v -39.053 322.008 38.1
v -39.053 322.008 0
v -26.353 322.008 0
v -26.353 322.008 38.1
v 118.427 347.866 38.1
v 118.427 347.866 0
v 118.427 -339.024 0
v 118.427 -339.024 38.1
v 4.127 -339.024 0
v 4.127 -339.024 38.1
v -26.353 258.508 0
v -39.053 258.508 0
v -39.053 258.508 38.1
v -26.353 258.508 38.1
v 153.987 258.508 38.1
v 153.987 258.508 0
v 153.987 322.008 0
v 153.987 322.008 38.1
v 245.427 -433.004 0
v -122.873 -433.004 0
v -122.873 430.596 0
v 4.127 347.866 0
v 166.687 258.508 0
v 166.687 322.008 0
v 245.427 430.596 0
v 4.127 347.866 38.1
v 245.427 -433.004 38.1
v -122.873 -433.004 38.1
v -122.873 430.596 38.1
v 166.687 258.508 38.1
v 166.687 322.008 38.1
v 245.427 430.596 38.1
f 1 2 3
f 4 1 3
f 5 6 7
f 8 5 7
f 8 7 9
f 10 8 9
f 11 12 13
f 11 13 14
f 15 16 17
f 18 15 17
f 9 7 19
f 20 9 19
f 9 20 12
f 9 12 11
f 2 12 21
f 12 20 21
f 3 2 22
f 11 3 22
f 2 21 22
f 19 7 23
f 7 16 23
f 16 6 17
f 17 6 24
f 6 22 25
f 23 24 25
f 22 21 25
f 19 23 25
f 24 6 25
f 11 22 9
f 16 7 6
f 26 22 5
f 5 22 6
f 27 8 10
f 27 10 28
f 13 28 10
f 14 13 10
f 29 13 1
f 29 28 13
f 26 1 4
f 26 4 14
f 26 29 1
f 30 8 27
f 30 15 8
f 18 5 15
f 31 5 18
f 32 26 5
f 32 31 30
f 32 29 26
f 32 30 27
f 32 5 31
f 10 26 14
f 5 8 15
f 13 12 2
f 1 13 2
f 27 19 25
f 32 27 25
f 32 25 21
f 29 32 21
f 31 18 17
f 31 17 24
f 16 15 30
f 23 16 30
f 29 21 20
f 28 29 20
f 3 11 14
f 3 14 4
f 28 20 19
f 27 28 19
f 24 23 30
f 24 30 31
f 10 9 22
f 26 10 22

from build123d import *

# Parameters (mm, degrees)
F0_W     = 127
F0_H     = 686.889625
F0_W_2   = 12.7
F0_H_2   = 63.5
F0_H_3   = 93.98
F0_W_3   = 114.3
F0_H_4   = 82.730375
F1_DEPTH = 38.1


with BuildPart() as f1:
    # F0 (on Top) → F1 (new body)
    with BuildSketch(Plane.XY):
        with Locations((-59.372775, 4.420739)):
            Rectangle(F0_W, F0_H)
        with Locations((-32.702775, 290.258352)):
            Rectangle(F0_W_2, F0_H_2, mode=Mode.SUBTRACT)
        with Locations((-59.372775, -386.014073)):
            Rectangle(F0_W, F0_H_3)
        with Locations((61.277225, -386.014073)):
            Rectangle(F0_W_3, F0_H_3)
        with Locations((181.927225, -386.014073)):
            Rectangle(F0_W, F0_H_3)
        with Locations((181.927225, 4.420739)):
            Rectangle(F0_W, F0_H)
        with Locations((160.337225, 290.258352)):
            Rectangle(F0_W_2, F0_H_2, mode=Mode.SUBTRACT)
        with Locations((181.927225, 389.230739)):
            Rectangle(F0_W, F0_H_4)
        with Locations((61.277225, 389.230739)):
            Rectangle(F0_W_3, F0_H_4)
        with Locations((-59.372775, 389.230739)):
            Rectangle(F0_W, F0_H_4)
    extrude(amount=F1_DEPTH)


solid = f1.part
